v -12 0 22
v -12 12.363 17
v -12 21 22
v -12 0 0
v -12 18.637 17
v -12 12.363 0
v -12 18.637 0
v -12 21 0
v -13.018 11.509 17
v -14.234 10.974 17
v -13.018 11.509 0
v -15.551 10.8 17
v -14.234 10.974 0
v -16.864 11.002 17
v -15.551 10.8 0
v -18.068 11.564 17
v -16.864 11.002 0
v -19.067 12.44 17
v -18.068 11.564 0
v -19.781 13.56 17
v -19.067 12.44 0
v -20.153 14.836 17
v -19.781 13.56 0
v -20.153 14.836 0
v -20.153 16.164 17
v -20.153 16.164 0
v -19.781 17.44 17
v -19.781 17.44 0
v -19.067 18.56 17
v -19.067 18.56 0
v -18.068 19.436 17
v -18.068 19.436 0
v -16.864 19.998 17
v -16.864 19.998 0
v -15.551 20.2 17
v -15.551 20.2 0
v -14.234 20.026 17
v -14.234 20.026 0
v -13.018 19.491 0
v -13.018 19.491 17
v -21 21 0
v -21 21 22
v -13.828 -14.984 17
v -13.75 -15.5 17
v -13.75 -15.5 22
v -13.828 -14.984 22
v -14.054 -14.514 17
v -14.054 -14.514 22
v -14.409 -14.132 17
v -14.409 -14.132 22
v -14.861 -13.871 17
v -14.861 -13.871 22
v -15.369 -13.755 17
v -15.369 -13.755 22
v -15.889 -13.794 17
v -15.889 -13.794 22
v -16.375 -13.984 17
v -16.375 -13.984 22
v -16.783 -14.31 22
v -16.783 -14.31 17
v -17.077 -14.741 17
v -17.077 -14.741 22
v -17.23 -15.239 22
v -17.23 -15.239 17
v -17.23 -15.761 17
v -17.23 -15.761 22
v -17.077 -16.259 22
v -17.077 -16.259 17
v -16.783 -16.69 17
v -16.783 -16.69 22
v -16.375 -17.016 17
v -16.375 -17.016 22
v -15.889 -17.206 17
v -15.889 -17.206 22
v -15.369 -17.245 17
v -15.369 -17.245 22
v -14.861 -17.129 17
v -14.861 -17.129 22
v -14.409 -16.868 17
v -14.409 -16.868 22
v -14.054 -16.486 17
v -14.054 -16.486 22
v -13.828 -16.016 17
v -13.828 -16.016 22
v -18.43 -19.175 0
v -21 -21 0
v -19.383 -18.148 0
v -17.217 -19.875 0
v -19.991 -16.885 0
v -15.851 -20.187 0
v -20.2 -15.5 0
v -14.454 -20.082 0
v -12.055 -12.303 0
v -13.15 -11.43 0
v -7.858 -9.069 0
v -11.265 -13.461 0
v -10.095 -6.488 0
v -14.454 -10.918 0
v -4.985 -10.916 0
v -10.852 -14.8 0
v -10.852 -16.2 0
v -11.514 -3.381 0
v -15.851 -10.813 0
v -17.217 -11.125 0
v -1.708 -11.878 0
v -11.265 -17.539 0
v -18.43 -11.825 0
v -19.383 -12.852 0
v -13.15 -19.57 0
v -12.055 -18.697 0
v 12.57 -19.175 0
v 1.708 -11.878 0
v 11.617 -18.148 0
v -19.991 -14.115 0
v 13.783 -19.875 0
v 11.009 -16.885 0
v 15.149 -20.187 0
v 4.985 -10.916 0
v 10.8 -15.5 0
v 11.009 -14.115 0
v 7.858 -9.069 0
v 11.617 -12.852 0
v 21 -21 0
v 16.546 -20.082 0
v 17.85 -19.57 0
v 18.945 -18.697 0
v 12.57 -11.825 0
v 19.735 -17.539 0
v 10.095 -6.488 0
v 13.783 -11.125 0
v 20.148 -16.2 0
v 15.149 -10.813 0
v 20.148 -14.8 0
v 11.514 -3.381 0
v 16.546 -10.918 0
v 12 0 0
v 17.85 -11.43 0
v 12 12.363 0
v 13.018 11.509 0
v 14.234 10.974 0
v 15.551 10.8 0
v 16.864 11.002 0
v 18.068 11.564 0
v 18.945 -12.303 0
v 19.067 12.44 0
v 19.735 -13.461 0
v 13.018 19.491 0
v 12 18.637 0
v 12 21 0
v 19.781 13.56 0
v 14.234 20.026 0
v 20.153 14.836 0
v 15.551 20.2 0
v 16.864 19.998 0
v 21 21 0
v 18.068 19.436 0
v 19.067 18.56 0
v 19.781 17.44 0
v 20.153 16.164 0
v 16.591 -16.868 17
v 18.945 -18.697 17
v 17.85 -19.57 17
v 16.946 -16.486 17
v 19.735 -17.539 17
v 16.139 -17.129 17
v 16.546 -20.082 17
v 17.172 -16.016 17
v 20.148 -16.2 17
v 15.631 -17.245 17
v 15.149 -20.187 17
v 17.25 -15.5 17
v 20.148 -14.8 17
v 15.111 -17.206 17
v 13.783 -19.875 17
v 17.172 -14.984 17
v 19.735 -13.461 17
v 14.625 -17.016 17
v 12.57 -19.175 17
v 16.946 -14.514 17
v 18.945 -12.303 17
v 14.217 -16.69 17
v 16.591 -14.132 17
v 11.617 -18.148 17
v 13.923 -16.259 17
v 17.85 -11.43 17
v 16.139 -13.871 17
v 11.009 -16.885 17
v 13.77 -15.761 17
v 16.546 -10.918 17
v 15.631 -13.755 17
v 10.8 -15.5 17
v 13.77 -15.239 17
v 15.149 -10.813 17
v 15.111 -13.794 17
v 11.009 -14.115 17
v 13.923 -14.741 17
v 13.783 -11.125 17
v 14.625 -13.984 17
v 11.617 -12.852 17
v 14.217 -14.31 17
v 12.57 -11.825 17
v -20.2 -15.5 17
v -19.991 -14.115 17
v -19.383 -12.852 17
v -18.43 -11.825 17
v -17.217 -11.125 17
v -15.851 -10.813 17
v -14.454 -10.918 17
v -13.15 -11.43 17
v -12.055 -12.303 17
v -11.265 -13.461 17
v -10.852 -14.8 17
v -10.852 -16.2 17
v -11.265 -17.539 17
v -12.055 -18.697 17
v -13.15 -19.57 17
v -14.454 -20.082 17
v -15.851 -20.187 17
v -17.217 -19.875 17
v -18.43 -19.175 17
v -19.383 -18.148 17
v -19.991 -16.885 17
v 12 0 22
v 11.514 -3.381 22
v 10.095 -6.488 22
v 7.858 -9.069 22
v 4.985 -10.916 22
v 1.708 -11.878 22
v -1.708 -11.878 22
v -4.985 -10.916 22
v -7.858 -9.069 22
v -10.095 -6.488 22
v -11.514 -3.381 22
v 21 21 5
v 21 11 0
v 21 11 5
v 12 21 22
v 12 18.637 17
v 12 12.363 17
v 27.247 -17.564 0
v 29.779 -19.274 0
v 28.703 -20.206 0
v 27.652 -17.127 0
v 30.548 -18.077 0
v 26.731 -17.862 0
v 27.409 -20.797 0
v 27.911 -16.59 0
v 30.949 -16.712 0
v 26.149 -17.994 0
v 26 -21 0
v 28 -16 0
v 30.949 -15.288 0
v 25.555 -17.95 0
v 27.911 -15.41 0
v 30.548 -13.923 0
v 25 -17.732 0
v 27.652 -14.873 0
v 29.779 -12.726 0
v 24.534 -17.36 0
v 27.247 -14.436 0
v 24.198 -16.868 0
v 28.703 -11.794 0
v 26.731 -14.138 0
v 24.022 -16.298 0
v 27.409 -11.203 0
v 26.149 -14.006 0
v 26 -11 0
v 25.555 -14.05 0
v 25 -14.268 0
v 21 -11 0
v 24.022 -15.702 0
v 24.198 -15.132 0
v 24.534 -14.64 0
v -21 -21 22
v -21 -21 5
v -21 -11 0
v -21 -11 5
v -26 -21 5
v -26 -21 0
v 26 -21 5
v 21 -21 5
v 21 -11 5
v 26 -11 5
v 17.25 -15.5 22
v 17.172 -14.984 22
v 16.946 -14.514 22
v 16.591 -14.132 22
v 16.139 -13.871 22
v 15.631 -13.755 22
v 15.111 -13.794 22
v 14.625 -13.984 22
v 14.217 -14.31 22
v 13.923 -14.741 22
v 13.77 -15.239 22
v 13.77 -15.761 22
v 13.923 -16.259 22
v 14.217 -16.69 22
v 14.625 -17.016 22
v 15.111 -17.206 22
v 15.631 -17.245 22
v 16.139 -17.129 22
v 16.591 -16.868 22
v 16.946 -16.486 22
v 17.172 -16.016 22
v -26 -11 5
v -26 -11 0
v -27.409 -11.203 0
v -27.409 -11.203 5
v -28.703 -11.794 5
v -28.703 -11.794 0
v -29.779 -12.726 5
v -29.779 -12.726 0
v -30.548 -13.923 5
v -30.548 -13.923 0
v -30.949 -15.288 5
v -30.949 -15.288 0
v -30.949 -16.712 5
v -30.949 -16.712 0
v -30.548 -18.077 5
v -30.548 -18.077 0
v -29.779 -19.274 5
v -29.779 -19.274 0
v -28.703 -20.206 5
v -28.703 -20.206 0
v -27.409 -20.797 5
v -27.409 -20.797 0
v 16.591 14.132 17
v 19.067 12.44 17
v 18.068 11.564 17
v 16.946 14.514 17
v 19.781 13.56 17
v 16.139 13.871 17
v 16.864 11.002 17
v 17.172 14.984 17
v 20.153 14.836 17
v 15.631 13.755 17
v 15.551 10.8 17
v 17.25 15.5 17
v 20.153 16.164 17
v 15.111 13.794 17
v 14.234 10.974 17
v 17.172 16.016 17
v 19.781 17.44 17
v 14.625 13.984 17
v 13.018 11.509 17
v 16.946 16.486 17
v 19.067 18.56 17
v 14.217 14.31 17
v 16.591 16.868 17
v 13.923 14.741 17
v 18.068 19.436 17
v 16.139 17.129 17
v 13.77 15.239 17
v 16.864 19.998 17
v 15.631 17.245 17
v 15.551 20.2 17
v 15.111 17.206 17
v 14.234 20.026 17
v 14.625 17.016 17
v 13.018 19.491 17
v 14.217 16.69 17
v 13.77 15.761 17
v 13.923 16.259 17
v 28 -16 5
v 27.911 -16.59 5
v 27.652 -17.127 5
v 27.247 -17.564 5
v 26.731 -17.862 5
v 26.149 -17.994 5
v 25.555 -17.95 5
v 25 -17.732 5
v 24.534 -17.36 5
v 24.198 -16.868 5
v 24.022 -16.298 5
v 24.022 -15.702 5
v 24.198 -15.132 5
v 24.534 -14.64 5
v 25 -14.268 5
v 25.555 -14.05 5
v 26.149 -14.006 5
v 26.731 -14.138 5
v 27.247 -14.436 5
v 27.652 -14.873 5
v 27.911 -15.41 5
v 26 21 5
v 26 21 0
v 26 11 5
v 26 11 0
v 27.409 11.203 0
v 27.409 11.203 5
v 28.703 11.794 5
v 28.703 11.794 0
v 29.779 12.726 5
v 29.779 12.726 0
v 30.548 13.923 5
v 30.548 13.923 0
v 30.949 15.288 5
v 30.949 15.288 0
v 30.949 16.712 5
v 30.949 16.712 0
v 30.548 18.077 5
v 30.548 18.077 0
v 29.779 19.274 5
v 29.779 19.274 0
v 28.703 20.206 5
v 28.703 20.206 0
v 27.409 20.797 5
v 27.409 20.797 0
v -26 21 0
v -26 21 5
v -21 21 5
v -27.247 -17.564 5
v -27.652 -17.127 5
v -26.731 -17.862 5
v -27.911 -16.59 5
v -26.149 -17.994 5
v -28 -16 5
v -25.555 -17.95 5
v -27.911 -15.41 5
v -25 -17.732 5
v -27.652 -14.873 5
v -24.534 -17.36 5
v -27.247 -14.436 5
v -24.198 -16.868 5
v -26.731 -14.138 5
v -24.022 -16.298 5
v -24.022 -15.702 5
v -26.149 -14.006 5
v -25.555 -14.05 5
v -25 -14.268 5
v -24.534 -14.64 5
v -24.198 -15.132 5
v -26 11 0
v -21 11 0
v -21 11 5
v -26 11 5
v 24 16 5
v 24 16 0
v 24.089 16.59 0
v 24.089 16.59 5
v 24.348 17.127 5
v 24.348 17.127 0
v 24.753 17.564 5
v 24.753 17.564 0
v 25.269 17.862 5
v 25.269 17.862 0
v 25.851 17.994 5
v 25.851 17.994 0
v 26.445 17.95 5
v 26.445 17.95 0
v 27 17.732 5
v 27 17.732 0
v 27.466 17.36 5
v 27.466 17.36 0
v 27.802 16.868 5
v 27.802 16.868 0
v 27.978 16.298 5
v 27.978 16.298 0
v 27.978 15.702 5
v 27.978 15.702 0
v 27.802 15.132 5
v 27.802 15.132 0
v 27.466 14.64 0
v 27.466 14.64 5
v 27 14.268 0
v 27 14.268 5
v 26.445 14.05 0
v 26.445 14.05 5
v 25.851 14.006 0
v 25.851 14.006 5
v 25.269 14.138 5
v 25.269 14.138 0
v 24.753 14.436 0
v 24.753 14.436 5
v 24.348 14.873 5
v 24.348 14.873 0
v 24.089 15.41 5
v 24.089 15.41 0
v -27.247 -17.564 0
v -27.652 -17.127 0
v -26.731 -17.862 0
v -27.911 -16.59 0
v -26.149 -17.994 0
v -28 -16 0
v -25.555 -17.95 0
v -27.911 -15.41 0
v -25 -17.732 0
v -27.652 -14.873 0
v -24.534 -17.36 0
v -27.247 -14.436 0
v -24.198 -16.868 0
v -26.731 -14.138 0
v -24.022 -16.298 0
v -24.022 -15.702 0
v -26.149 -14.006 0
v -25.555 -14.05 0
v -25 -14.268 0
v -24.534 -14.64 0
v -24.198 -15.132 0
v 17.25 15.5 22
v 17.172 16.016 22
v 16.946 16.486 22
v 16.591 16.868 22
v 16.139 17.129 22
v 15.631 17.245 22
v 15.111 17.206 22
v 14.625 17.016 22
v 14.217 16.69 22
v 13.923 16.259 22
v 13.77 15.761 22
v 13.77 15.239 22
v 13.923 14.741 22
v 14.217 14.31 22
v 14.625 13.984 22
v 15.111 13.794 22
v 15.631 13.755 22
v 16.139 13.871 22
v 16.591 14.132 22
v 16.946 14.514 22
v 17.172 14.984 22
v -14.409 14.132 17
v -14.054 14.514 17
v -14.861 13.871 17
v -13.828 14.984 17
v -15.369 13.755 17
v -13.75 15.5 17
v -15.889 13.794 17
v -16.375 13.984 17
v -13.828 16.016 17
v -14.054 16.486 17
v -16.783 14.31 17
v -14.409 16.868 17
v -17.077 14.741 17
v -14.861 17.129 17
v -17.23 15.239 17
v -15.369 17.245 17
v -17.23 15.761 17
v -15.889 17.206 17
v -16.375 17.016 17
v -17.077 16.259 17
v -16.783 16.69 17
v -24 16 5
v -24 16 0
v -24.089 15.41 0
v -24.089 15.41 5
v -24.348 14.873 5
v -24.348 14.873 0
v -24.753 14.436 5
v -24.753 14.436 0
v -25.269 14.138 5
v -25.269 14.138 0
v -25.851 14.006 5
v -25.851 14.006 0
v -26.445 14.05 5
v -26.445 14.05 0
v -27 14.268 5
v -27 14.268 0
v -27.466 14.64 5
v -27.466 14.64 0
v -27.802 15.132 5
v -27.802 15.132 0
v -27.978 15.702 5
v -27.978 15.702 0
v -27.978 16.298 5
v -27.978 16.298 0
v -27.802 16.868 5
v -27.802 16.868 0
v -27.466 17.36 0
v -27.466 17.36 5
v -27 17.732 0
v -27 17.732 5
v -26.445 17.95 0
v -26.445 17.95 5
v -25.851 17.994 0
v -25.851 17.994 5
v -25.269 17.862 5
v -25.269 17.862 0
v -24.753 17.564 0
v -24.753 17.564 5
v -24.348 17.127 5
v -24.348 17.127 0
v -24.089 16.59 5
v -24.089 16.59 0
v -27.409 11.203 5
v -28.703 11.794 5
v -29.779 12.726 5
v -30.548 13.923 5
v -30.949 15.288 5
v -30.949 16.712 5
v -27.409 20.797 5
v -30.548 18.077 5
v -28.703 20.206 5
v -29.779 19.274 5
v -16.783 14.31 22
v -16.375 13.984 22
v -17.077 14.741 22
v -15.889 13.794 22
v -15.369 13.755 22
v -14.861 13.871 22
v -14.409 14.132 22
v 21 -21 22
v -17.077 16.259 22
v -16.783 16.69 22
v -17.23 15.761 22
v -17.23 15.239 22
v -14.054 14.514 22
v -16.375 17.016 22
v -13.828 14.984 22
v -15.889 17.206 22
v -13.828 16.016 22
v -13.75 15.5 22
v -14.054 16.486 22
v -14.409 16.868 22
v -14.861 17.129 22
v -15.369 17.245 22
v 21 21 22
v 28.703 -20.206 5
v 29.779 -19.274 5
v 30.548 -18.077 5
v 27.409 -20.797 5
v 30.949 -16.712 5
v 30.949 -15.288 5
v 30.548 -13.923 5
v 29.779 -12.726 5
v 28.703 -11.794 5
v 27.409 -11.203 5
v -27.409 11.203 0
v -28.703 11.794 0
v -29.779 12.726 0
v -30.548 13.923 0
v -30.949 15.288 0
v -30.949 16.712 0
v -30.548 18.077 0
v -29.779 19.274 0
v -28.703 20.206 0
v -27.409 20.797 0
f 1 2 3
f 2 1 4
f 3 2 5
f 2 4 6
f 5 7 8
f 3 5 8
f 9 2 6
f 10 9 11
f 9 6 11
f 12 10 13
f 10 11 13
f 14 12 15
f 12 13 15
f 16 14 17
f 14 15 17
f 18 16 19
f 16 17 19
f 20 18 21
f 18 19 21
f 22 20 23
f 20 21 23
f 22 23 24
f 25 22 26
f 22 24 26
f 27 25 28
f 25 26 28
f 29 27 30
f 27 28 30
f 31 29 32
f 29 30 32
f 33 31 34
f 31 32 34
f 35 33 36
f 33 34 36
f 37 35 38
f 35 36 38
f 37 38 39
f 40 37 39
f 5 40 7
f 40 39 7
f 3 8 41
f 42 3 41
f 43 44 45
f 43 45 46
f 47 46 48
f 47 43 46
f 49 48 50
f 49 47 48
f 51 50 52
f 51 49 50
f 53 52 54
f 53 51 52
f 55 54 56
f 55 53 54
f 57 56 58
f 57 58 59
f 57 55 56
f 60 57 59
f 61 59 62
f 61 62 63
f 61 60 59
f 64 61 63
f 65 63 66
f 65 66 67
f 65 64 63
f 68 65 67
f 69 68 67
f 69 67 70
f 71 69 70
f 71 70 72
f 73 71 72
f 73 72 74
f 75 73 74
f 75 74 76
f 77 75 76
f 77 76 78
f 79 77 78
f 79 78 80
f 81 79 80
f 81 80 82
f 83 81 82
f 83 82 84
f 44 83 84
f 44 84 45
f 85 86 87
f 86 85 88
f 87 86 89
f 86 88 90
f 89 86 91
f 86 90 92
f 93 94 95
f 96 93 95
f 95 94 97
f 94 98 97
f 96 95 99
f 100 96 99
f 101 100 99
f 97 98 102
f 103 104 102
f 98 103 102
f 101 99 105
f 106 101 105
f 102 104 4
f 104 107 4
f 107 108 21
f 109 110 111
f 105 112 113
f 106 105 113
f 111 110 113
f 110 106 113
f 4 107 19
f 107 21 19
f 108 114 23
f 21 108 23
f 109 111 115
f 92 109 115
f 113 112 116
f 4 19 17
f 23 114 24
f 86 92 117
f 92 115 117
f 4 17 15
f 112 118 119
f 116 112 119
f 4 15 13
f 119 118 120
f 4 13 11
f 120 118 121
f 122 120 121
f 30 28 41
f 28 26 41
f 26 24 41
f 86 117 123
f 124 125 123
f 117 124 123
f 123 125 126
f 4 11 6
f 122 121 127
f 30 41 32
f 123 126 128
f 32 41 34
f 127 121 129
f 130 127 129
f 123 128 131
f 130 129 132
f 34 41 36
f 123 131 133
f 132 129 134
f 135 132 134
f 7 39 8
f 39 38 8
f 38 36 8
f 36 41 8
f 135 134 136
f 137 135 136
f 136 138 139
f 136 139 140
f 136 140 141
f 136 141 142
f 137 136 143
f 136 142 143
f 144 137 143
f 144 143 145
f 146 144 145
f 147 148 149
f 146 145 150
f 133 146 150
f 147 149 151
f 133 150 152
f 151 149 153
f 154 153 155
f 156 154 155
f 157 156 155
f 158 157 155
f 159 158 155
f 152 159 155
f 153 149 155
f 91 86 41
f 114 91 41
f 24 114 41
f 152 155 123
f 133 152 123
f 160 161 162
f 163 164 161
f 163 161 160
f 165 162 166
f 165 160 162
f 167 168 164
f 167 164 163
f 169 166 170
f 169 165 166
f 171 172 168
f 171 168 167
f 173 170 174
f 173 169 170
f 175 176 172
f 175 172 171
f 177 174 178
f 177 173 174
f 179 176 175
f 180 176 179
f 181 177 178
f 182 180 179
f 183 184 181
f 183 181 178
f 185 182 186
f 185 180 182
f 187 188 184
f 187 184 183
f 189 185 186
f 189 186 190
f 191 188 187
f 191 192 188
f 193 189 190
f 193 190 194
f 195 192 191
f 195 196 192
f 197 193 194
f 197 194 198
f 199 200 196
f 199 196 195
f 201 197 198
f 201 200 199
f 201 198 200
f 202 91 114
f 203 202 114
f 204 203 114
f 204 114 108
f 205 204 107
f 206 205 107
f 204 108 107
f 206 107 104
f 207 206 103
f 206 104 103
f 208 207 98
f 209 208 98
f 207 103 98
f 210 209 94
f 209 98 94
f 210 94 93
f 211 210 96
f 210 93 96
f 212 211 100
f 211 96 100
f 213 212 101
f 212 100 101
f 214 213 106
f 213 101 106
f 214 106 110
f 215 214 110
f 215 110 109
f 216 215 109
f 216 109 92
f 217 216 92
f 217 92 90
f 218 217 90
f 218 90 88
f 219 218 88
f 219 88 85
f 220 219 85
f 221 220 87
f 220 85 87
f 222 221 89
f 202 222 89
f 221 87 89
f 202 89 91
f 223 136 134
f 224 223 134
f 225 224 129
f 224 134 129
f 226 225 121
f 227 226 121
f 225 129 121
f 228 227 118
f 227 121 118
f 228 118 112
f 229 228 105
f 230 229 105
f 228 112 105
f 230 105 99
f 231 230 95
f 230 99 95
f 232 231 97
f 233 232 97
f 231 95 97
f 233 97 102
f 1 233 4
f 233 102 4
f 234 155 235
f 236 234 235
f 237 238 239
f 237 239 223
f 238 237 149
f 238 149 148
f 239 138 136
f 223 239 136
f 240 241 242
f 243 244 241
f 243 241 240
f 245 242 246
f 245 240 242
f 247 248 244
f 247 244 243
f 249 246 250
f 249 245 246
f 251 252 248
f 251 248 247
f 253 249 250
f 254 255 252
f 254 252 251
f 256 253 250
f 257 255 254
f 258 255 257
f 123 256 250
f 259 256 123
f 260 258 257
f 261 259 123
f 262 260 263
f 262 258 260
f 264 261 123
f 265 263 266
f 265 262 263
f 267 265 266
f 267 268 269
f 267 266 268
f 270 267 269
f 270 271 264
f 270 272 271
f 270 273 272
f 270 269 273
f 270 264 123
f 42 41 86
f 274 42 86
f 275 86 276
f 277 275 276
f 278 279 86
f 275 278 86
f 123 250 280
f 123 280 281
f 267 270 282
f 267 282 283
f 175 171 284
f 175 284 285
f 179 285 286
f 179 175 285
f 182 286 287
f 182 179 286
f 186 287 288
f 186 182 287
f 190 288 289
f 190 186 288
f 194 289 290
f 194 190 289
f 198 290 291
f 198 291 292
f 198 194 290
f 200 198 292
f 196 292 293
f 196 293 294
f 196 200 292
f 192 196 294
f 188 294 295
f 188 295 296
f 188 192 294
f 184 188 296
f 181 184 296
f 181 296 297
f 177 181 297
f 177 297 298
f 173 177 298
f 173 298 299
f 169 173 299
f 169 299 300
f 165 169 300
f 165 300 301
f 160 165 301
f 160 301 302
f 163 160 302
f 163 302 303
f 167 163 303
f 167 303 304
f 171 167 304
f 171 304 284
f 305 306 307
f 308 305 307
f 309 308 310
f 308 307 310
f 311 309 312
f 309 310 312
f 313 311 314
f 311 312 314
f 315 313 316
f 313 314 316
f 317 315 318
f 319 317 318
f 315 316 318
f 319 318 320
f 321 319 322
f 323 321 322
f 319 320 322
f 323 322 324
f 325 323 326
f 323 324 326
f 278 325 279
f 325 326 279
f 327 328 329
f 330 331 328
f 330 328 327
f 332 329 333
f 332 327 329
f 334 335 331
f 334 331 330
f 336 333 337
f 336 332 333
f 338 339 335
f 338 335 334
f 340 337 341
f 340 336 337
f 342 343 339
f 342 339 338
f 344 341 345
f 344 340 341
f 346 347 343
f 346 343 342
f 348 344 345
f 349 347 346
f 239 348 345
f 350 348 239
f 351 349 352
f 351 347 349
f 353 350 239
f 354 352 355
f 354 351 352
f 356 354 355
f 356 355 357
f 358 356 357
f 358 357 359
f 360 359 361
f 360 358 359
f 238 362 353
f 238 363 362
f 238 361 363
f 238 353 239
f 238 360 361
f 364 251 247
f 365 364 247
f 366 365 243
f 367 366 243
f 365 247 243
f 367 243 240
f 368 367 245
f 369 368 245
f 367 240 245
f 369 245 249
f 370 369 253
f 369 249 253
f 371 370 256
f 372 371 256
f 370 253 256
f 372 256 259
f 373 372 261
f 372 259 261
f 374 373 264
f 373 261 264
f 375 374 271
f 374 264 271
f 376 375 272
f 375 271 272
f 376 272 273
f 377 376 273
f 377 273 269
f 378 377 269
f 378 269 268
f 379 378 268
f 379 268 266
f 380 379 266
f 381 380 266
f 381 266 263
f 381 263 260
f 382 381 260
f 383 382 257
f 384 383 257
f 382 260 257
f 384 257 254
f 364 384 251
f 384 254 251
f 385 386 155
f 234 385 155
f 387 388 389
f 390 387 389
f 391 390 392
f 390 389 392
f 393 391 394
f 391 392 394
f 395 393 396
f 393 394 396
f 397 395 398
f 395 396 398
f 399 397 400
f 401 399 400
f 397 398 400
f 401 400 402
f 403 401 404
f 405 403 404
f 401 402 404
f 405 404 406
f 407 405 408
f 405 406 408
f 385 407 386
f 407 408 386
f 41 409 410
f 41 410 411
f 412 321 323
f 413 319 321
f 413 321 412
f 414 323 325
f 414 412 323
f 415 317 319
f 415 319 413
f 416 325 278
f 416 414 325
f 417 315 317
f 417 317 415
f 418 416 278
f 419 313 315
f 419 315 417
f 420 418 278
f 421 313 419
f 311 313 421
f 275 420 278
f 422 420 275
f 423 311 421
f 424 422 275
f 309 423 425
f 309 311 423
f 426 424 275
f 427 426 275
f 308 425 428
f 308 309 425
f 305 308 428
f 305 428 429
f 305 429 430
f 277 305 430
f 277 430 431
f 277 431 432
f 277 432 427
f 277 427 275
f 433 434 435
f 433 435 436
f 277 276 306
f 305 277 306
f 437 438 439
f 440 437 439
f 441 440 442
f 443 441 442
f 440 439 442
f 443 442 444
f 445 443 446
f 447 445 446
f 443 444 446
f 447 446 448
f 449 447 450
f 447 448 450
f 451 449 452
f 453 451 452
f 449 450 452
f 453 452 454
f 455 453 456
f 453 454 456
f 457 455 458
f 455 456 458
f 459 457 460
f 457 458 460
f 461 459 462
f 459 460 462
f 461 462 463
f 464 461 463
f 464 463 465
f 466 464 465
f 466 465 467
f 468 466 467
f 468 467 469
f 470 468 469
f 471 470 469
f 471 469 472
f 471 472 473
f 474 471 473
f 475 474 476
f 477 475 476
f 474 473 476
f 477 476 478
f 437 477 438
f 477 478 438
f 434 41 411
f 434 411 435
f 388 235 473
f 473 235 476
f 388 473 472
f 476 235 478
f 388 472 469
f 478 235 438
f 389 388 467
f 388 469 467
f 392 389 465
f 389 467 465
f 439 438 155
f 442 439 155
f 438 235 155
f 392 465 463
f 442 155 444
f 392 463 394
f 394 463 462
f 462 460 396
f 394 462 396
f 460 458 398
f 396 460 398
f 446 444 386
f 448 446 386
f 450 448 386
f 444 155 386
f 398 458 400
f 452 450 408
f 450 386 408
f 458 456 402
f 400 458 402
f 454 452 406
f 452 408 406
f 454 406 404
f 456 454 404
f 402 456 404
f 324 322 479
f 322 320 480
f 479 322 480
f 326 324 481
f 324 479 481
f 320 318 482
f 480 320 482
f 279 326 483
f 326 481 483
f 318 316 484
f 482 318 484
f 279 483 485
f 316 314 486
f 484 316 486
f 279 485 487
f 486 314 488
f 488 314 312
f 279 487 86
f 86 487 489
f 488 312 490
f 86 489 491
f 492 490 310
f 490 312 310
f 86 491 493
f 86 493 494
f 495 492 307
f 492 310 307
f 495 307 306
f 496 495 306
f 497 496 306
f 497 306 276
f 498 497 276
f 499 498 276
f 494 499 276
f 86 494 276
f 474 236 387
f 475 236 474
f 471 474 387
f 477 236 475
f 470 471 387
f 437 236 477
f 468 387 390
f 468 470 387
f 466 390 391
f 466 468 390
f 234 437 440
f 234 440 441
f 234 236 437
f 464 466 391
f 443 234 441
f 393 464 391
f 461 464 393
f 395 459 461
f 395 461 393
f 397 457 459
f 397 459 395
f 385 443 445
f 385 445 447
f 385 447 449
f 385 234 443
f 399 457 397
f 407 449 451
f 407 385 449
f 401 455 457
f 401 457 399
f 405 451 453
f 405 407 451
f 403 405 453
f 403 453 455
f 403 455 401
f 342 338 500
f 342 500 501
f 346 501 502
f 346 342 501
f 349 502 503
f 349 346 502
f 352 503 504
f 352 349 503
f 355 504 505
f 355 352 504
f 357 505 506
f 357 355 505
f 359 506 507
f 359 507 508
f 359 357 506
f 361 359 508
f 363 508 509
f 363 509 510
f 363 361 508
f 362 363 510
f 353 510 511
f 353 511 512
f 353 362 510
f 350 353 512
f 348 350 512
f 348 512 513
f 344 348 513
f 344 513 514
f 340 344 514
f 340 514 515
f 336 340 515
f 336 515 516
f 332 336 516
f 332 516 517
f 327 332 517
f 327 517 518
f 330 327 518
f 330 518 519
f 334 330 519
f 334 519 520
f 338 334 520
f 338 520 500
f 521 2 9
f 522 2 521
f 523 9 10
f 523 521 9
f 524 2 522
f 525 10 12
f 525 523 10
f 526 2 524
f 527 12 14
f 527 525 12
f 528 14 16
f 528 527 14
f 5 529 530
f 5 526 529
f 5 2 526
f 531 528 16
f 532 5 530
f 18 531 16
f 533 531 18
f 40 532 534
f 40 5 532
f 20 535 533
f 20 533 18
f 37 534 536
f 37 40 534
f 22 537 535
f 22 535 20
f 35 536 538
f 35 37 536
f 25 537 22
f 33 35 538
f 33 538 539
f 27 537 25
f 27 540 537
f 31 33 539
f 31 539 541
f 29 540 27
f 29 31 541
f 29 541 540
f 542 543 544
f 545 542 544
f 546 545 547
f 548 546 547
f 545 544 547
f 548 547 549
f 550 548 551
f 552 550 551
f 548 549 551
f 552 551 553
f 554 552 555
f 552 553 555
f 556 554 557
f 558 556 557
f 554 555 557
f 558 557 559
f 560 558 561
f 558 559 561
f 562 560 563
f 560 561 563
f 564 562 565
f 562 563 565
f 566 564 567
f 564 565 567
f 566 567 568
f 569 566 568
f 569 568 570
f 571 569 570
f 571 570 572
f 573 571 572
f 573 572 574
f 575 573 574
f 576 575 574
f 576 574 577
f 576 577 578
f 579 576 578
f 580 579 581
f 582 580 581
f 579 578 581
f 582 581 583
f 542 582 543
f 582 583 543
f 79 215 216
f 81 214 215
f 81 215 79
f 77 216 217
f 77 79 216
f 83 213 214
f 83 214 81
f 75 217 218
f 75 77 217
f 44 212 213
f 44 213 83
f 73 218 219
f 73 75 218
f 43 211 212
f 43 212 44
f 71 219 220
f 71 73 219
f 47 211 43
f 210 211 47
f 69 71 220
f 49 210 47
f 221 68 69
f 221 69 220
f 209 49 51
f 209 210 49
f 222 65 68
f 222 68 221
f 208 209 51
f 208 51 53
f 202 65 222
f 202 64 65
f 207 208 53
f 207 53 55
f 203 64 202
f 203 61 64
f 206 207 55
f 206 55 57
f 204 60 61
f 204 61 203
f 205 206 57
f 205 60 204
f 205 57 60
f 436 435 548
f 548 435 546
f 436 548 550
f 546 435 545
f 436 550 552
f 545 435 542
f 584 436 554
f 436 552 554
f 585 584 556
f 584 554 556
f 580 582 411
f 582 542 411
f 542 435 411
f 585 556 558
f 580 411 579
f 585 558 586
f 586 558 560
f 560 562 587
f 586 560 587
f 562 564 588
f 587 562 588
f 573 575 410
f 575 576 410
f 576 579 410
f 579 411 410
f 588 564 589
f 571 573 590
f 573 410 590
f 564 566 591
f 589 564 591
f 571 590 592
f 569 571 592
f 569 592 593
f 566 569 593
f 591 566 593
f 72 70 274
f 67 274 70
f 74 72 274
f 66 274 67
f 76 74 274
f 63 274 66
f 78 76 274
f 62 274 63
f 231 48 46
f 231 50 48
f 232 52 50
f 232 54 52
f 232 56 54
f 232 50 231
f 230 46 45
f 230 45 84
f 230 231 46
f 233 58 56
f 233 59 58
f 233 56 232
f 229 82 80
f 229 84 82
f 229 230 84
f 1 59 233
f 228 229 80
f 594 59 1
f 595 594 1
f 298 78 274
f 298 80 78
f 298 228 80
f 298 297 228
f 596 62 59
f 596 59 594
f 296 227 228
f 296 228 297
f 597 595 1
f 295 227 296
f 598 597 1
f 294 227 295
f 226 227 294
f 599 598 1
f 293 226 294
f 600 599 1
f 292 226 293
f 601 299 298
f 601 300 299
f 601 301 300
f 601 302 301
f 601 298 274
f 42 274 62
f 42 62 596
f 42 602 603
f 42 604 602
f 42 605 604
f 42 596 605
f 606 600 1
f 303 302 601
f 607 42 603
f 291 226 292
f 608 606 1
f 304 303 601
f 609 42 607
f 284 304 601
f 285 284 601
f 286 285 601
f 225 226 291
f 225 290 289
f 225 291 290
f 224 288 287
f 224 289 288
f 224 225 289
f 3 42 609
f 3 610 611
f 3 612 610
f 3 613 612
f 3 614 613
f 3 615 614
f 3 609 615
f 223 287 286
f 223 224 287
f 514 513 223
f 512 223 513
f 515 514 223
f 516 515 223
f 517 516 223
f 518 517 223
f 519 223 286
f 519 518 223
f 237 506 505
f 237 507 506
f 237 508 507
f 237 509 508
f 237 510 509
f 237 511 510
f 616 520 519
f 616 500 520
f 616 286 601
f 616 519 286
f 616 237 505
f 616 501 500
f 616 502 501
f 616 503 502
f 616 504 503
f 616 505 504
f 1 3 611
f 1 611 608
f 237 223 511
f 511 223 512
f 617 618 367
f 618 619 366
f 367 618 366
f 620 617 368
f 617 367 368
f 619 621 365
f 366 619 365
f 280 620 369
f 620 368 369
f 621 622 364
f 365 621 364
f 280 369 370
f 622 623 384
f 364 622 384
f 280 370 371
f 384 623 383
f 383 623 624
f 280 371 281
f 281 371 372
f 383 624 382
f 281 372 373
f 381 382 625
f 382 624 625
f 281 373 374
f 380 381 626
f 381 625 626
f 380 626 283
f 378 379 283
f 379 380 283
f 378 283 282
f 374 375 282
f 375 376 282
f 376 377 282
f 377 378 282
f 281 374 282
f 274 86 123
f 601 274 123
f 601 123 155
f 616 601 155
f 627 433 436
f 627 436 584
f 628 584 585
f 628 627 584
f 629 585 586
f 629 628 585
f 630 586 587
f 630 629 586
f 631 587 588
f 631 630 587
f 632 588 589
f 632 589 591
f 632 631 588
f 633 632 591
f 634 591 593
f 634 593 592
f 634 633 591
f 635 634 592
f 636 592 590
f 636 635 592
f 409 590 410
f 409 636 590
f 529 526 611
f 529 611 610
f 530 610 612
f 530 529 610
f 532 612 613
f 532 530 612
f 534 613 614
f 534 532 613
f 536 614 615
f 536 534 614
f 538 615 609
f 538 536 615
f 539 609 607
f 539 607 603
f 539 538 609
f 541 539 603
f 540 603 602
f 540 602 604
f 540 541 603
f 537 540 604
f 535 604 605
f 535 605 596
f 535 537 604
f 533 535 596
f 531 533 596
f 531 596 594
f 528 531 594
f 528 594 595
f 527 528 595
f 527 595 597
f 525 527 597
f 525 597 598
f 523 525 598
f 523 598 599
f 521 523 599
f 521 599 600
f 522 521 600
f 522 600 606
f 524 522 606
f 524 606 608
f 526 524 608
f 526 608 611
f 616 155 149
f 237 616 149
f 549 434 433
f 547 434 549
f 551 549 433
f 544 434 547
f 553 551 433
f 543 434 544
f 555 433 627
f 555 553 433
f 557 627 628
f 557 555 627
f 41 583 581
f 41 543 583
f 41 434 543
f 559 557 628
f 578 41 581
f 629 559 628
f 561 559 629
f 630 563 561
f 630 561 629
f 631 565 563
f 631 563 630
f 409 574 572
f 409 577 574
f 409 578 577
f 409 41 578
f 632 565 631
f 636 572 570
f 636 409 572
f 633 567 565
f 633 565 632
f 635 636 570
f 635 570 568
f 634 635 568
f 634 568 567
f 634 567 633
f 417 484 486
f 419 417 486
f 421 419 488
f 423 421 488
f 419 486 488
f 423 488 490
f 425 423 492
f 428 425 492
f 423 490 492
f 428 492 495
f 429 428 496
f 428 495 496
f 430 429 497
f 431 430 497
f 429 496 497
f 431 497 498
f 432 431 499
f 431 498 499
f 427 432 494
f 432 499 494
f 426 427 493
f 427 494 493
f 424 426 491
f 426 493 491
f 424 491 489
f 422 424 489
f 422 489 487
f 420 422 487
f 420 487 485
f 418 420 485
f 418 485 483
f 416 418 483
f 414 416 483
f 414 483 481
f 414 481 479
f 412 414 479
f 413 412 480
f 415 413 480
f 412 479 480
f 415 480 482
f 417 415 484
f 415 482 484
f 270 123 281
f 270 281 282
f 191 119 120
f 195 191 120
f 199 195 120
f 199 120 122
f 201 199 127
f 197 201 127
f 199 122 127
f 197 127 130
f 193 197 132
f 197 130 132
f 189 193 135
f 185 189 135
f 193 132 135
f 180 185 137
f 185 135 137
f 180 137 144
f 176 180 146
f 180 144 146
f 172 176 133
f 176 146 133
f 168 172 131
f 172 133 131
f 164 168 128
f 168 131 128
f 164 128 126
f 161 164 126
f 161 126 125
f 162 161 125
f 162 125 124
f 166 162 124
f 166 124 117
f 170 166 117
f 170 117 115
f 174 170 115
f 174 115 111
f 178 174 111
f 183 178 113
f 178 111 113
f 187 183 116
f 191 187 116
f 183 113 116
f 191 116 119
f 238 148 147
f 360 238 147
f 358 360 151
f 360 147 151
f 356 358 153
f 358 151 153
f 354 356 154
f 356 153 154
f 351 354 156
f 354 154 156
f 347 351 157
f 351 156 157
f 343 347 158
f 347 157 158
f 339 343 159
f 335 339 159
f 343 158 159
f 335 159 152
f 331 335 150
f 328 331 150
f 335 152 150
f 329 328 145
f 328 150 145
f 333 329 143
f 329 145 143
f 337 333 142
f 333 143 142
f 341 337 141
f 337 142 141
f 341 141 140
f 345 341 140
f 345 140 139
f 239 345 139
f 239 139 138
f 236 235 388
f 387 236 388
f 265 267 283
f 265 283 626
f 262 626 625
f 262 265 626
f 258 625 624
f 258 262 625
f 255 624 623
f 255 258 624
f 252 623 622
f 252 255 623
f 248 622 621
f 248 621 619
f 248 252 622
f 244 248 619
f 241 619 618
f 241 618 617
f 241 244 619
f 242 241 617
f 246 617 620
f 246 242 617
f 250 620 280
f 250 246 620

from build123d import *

# Parameters (mm, degrees)
ESBO_O1_R                  = 1.75
RESSALTO_EXTRUS_O1_DEPTH   = 22
ESBO_O2_R                  = 4.7
CORTE_EXTRUS_O1_DEPTH      = 17
ESBO_O4_R                  = 2
RESSALTO_EXTRUS_O2_DEPTH   = 5
RESSALTO_EXTRUS_O2_2_DEPTH = 5
RESSALTO_EXTRUS_O2_3_DEPTH = 5
RESSALTO_EXTRUS_O2_4_DEPTH = 5


with BuildPart() as part:
    # Esboço1 → Ressalto-extrusão1 (new body)
    with BuildSketch(Plane.XY):
        with BuildLine():
            Line((-12, 0), (-12, 21))
            Line((-12, 21), (-21, 21))
            Line((-21, 21), (-21, -21))
            Line((-21, -21), (21, -21))
            Line((21, -21), (21, 21))
            Line((21, 21), (12, 21))
            Line((12, 21), (12, 0))
            ThreePointArc((12, 0), (0, -12), (-12, 0))
        make_face()
        with Locations((-15.5, 15.5)):
            Circle(ESBO_O1_R, mode=Mode.SUBTRACT)
        with Locations((15.5, 15.5)):
            Circle(ESBO_O1_R, mode=Mode.SUBTRACT)
        with Locations((15.5, -15.5)):
            Circle(ESBO_O1_R, mode=Mode.SUBTRACT)
        with Locations((-15.5, -15.5)):
            Circle(ESBO_O1_R, mode=Mode.SUBTRACT)
    extrude(amount=RESSALTO_EXTRUS_O1_DEPTH)

    # Esboço2 → Corte-extrusão1 (cut)
    with BuildSketch(Plane(origin=(0, 0, 0), x_dir=(-1, 0, 0), z_dir=(0, 0, -1))):
        with Locations((-15.5, 15.5)):
            Circle(ESBO_O2_R)
        with Locations((15.5, 15.5)):
            Circle(ESBO_O2_R)
        with Locations((15.5, -15.5)):
            Circle(ESBO_O2_R)
        with Locations((-15.5, -15.5)):
            Circle(ESBO_O2_R)
    extrude(amount=-CORTE_EXTRUS_O1_DEPTH, mode=Mode.SUBTRACT)


with BuildPart() as body_2:
    # Esboço4 → Ressalto-extrusão2 (new body)
    with BuildSketch(Plane(origin=(0, 0, 0), x_dir=(-1, 0, 0), z_dir=(0, 0, -1))):
        with BuildLine():
            Line((-26, 21), (-21, 21))
            Line((-21, 21), (-21, 11))
            Line((-21, 11), (-26, 11))
            ThreePointArc((-26, 11), (-31, 16), (-26, 21))
        make_face()
        with Locations((-26, 16)):
            Circle(ESBO_O4_R, mode=Mode.SUBTRACT)
    extrude(amount=-RESSALTO_EXTRUS_O2_DEPTH)


with BuildPart() as body_3:
    # Esboço4 → Ressalto-extrus_o2 2 (new body)
    with BuildSketch(Plane(origin=(0, 0, 0), x_dir=(-1, 0, 0), z_dir=(0, 0, -1))):
        with BuildLine():
            Line((26, -21), (21, -21))
            Line((21, -21), (21, -11))
            Line((21, -11), (26, -11))
            ThreePointArc((26, -11), (31, -16), (26, -21))
        make_face()
        with Locations((26, -16)):
            Circle(ESBO_O4_R, mode=Mode.SUBTRACT)
    extrude(amount=-RESSALTO_EXTRUS_O2_2_DEPTH)


with BuildPart() as body_4:
    # Esboço4 → Ressalto-extrus_o2 3 (new body)
    with BuildSketch(Plane(origin=(0, 0, 0), x_dir=(-1, 0, 0), z_dir=(0, 0, -1))):
        with BuildLine():
            Line((-21, -21), (-21, -11))
            Line((-21, -11), (-26, -11))
            ThreePointArc((-26, -11), (-31, -16), (-26, -21))
            Line((-26, -21), (-21, -21))
        make_face()
        with Locations(Location((-26, -16, 0), (0, 0, 180))):
            Circle(ESBO_O4_R, mode=Mode.SUBTRACT)
    extrude(amount=-RESSALTO_EXTRUS_O2_3_DEPTH)


with BuildPart() as body_5:
    # Esboço4 → Ressalto-extrus_o2 4 (new body)
    with BuildSketch(Plane(origin=(0, 0, 0), x_dir=(-1, 0, 0), z_dir=(0, 0, -1))):
        with BuildLine():
            Line((21, 21), (21, 11))
            Line((21, 11), (26, 11))
            ThreePointArc((26, 11), (31, 16), (26, 21))
            Line((26, 21), (21, 21))
        make_face()
        with Locations(Location((26, 16, 0), (0, 0, 180))):
            Circle(ESBO_O4_R, mode=Mode.SUBTRACT)
    extrude(amount=-RESSALTO_EXTRUS_O2_4_DEPTH)


solid = Compound([part.part, body_2.part, body_3.part, body_4.part, body_5.part])
